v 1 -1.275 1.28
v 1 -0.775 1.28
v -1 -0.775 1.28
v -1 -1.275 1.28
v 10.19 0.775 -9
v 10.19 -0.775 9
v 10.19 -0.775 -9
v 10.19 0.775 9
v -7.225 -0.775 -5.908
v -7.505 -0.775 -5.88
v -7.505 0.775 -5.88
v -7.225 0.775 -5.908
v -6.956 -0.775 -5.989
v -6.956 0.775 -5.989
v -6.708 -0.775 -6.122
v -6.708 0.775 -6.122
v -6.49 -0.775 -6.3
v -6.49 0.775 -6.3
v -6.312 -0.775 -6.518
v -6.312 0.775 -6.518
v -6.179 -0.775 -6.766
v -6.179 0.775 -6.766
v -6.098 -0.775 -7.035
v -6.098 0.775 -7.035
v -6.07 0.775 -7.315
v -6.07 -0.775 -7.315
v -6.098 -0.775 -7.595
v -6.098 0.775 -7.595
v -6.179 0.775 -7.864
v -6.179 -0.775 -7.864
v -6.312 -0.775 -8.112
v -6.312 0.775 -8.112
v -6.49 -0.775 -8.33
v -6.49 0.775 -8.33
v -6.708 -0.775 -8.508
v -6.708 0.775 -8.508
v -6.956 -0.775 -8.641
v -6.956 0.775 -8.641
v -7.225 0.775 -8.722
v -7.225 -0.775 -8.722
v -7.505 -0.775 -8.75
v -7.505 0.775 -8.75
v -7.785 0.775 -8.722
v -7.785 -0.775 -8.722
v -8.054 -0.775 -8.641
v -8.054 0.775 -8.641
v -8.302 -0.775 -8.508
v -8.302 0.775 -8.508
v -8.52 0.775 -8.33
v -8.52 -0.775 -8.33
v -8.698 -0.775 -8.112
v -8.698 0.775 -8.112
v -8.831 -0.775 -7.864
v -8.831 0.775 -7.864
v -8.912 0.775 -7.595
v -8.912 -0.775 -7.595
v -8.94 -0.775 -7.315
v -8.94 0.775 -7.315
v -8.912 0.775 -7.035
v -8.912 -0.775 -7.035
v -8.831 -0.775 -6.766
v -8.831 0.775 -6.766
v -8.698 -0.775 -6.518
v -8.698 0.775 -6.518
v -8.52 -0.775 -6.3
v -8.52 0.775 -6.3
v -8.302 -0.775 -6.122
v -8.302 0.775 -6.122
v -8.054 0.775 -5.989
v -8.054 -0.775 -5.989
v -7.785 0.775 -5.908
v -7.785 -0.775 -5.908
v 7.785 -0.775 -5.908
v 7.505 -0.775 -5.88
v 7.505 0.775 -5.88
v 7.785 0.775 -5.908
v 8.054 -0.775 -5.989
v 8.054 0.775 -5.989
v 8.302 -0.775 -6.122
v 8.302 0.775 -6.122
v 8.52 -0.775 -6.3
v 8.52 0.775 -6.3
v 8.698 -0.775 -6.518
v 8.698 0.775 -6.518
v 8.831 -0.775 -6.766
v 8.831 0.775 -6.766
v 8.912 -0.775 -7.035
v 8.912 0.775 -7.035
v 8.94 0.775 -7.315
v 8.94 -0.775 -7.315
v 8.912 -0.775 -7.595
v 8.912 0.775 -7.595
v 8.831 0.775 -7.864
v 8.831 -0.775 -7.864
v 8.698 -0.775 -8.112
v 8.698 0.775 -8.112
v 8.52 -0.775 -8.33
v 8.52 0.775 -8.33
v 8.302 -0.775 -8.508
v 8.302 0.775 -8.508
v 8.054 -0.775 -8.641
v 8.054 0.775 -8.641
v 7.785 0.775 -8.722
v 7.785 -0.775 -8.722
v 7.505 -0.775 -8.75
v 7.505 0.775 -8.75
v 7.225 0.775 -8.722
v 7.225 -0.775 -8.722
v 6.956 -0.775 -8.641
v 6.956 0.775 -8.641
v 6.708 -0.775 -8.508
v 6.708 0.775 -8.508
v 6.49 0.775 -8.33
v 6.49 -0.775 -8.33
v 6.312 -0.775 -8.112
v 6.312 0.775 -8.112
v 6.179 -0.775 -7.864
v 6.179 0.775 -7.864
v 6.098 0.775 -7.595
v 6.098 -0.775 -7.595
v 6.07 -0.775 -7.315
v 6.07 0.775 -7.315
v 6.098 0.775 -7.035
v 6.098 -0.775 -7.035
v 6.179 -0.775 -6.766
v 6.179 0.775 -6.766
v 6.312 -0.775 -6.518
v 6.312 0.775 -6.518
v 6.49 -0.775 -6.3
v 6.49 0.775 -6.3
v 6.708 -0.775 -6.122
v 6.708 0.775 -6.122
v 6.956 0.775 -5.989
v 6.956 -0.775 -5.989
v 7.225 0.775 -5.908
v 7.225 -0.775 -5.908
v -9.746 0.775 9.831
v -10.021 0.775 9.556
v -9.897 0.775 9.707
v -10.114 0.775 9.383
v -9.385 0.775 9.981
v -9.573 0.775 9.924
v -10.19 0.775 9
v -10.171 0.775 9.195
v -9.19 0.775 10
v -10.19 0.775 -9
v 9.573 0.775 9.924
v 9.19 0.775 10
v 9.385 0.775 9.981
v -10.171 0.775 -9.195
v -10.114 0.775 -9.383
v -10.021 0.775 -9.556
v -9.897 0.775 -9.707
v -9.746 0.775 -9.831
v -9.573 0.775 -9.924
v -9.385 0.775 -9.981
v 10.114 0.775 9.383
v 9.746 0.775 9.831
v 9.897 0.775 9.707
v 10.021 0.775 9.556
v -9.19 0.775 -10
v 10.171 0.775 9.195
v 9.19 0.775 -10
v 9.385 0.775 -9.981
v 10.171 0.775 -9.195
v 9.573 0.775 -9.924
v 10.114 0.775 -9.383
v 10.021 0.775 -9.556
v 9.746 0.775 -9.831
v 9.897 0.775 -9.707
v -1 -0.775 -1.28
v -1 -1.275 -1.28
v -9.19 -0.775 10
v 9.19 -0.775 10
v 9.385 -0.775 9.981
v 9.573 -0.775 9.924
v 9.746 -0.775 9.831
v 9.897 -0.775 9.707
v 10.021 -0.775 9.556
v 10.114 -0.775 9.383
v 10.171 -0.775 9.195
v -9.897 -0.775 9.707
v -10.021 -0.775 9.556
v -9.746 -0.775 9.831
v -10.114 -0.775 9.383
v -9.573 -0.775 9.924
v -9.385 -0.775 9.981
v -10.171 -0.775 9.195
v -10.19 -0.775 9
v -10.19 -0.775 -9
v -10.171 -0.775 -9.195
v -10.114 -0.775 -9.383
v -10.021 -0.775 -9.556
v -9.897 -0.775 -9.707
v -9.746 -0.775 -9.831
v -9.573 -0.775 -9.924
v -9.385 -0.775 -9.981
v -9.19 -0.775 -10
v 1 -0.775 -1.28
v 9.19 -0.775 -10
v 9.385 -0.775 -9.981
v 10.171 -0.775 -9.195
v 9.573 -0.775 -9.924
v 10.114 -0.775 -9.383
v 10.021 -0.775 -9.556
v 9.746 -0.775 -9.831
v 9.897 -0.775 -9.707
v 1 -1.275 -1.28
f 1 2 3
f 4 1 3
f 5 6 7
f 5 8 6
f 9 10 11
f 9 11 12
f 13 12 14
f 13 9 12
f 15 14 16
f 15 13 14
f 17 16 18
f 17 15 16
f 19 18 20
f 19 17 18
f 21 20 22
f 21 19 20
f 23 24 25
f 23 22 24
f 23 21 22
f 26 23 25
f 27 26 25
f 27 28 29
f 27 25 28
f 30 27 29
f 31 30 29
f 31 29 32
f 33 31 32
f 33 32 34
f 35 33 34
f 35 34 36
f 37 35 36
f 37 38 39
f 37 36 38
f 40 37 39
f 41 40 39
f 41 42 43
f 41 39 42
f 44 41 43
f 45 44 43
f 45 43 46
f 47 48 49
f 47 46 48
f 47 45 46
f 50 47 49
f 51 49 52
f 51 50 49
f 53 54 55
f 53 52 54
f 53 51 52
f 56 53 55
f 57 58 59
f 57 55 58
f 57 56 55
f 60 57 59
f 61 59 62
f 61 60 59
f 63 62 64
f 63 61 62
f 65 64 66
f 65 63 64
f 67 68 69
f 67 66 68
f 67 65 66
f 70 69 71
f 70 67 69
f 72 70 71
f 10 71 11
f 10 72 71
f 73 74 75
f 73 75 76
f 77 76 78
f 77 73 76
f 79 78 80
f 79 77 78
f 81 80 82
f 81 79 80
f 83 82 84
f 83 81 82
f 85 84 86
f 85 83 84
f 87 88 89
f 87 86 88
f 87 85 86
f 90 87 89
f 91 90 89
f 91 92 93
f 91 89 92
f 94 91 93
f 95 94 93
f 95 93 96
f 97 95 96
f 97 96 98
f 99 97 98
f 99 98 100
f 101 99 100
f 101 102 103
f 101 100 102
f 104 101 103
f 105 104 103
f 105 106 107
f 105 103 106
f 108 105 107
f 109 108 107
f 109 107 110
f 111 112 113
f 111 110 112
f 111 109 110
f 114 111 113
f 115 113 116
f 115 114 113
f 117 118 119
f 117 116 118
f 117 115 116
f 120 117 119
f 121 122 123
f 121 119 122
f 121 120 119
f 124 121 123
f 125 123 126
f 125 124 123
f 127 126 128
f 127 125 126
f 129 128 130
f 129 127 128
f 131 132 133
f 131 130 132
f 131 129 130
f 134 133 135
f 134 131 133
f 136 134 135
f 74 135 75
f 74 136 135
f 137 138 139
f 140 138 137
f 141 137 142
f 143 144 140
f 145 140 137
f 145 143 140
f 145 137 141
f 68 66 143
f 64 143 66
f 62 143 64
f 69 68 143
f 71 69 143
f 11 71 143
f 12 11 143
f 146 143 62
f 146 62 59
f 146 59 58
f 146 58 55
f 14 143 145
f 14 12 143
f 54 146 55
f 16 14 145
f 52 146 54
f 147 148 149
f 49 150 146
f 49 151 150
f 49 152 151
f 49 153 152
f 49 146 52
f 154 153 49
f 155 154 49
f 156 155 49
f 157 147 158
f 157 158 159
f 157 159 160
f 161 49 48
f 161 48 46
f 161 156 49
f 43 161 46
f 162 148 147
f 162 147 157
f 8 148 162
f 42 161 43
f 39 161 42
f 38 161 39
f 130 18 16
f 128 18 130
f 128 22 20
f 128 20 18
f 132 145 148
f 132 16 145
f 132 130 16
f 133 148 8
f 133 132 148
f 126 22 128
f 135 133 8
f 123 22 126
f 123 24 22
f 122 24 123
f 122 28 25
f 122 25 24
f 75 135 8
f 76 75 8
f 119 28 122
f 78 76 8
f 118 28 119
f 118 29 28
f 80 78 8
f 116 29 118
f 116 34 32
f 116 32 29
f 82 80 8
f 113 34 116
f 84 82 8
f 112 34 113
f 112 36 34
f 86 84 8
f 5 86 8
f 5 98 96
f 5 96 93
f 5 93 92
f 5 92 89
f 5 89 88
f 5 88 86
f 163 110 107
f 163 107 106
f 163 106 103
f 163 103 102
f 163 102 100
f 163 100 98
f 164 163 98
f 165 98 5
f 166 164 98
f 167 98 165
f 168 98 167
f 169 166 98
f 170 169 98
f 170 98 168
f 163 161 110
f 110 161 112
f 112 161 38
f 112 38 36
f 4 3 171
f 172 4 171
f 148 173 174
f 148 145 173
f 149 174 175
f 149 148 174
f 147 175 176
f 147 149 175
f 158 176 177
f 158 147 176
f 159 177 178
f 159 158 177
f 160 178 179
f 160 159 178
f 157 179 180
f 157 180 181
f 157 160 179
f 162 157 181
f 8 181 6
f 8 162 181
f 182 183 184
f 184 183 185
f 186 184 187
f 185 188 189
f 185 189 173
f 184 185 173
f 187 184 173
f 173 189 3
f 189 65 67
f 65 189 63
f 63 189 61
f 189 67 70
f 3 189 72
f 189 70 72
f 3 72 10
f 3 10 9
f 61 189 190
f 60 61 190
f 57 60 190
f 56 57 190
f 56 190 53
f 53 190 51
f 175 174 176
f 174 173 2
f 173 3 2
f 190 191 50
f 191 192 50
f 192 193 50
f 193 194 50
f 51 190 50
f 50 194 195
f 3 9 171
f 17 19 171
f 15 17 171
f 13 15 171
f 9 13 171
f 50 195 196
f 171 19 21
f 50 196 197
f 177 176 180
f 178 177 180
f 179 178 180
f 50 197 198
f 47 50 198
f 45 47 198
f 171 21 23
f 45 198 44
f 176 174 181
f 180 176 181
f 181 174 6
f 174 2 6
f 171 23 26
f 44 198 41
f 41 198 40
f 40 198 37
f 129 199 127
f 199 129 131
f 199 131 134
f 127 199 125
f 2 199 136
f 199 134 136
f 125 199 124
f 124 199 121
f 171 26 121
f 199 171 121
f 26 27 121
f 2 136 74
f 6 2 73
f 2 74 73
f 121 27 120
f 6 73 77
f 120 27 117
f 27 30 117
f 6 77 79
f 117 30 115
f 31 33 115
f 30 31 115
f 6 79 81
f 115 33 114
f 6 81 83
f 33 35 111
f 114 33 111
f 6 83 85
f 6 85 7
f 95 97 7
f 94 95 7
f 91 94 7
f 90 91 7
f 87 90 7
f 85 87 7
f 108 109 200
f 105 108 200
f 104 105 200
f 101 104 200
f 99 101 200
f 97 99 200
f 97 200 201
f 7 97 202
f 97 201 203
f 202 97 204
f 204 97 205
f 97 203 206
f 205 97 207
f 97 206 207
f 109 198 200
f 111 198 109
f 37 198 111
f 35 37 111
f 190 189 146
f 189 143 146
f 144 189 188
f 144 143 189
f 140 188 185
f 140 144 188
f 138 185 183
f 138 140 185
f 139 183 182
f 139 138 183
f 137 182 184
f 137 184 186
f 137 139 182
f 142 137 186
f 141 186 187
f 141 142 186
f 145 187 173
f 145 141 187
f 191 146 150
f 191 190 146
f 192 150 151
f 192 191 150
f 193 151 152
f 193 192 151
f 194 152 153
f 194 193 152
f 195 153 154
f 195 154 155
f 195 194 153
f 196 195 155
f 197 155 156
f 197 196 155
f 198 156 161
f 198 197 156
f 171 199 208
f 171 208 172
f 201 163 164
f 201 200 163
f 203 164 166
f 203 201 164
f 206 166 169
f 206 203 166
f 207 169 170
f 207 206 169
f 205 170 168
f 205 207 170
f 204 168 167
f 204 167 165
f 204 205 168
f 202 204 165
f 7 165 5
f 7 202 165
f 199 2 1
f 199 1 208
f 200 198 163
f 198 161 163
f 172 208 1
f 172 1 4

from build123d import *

# Parameters (mm, degrees)
SKETCH1_W               = 20.38
SKETCH1_H               = 20
BOSS_EXTRUDE1_DEPTH     = 0.775
CUT_EXTRUDE1_DEPTH      = 15.361009714
CUT_EXTRUDE1_DEPTH_BACK = 15.361009714
SKETCH2_R               = 1.435
FILLET1_R               = 1
SKETCH3_W               = 2
SKETCH3_H               = 2.56
BOSS_EXTRUDE2_DEPTH     = 0.5


with BuildPart() as part:
    # Sketch1 → Boss-Extrude1 (new, symmetric)
    with BuildSketch(Plane(origin=(0, 0, 0), x_dir=(1, 0, 0), z_dir=(0, 1, 0))):
        Rectangle(SKETCH1_W, SKETCH1_H)
    extrude(amount=BOSS_EXTRUDE1_DEPTH, both=True)

    # Sketch2 → Cut-Extrude1 (cut, two sides: drawn at the far end of the back side and taken through both)
    with BuildSketch(Plane(origin=(0, 0.775, 0), x_dir=(1, 0, 0), z_dir=(0, 1, 0)).offset(-CUT_EXTRUDE1_DEPTH_BACK)):
        with Locations(Location((-7.505, 7.315, 0), (0, 0, 270))):
            Circle(SKETCH2_R)
        with Locations(Location((7.505, 7.315, 0), (0, 0, 270))):
            Circle(SKETCH2_R)
    extrude(amount=CUT_EXTRUDE1_DEPTH + CUT_EXTRUDE1_DEPTH_BACK, mode=Mode.SUBTRACT)

    # Fillet1
    fillet1_edges = [part.edges().sort_by_distance(p)[0] for p in [
        (10.19, 0, 10),
        (-10.19, 0, 10),
        (-10.19, 0, -10),
        (10.19, 0, -10),
    ]]
    fillet(fillet1_edges, radius=FILLET1_R)

    # Sketch3 → Boss-Extrude2 (add)
    with BuildSketch(Plane(origin=(0, -0.775, 0), x_dir=(-1, 0, 0), z_dir=(0, -1, 0))):
        Rectangle(SKETCH3_W, SKETCH3_H)
    extrude(amount=BOSS_EXTRUDE2_DEPTH)


solid = part.part
